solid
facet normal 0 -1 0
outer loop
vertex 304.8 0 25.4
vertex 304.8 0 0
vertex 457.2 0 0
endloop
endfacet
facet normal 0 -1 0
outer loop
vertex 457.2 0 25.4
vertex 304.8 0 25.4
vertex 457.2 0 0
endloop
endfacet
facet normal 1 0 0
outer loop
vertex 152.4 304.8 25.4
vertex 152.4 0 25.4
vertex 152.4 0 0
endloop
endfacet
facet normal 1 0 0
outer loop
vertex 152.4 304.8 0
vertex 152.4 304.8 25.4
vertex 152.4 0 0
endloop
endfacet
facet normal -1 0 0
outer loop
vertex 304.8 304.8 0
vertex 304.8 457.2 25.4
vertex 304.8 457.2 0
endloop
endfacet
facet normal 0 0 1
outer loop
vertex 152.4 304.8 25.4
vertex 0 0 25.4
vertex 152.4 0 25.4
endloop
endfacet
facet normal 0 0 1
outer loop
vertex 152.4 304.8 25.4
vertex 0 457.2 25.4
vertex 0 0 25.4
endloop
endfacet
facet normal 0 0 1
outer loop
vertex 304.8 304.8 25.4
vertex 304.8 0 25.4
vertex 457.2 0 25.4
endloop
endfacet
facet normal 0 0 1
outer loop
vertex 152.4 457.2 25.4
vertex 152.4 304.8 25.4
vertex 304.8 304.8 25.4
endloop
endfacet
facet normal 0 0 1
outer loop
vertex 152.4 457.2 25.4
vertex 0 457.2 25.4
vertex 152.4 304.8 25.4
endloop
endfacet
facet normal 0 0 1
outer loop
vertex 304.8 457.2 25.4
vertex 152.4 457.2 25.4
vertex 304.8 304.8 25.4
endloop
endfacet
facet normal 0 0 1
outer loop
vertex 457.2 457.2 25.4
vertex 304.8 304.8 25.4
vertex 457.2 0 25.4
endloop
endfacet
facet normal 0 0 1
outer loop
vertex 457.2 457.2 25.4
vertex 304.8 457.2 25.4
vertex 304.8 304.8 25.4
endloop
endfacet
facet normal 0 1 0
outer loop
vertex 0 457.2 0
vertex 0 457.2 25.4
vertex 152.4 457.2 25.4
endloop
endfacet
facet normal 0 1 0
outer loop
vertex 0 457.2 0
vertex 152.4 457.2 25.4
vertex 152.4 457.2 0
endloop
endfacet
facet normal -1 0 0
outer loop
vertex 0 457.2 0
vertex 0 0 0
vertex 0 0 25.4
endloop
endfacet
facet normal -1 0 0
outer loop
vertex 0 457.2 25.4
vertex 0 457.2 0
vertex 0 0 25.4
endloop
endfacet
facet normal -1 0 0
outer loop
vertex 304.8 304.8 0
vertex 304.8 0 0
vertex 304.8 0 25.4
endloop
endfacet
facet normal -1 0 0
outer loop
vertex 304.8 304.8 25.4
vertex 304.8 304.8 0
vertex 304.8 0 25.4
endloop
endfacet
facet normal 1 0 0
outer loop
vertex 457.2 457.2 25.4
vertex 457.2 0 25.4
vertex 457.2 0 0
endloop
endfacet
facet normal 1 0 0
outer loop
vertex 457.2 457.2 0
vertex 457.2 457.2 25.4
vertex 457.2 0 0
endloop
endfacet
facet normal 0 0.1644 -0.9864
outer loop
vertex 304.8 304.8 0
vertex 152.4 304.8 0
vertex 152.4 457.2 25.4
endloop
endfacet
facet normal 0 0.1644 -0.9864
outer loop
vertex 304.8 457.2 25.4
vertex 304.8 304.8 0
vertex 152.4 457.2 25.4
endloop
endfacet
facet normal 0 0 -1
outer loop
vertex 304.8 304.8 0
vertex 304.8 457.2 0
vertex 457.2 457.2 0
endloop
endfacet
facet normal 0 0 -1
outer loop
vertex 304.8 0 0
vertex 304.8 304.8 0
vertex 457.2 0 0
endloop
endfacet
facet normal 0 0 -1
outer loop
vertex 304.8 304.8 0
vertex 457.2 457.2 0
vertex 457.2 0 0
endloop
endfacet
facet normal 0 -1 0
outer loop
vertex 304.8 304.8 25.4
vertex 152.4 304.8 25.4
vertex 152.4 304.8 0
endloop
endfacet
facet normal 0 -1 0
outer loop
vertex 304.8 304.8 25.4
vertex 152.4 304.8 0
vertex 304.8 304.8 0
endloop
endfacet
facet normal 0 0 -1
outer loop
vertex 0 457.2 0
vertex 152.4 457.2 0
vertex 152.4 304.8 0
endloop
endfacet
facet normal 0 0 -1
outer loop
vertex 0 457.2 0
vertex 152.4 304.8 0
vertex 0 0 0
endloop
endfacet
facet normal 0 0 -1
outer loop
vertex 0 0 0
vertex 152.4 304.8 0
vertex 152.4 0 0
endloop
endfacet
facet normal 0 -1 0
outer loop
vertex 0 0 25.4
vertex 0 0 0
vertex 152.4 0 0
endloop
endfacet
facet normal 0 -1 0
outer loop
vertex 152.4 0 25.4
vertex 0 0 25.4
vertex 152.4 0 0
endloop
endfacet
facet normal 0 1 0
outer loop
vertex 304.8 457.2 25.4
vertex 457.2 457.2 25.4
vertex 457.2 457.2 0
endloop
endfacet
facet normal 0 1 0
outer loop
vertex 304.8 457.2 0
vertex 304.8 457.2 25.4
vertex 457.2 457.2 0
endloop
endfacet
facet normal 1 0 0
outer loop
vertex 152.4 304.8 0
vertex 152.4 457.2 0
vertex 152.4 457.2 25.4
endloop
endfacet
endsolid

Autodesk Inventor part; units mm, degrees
ref_plane "YZ Plane" through (0, 0, 0) normal (1, 0, 0) x (0, 1, 0)
ref_plane "XZ Plane" through (0, 0, 0) normal (0, 1, 0) x (-1, 0, 0)
ref_plane "XY Plane" through (0, 0, 0) normal (0, 0, 1) x (1, 0, 0)
sketch "Sketch1" plane through (0, 0, 0) normal (0, 0, 1) x (1, 0, 0)
  line L0 (0, 0) -> (457.2, 0)
  line L1 (457.2, 0) -> (457.2, 457.2)
  line L2 (457.2, 457.2) -> (0, 457.2)
  line L3 (0, 457.2) -> (0, 0)
  dimension "d0" = 457.2
  dimension "d1" = 457.2
extrude "Extrusion1" add sketch "Sketch1" along normal blind 25.4
sketch "Sketch2" plane through (0, 0, 0) normal (-1, 0, 0) x (0, 0, 1)
  line L0 (0, 457.2) -> (25.4, 457.2) projected
  line L1 (0, 457.2) -> (0, 304.8)
  line L2 (0, 0) -> (0, 457.2) projected
  line L3 (25.4, 0) -> (25.4, 457.2) projected
  line L4 (0, 304.8) -> (25.4, 457.2)
  dimension "d4" = 152.4
extrude "Extrusion2" cut sketch "Sketch2" against normal blind 457.2
sketch "Sketch3" plane through (0, 0, 0) normal (-1, 0, 0) x (0, 0, 1)
  line L0 (25.4, 457.2) -> (25.4, 0) projected
  line L1 (25.4, 457.2) -> (0, 457.2)
  line L2 (0, 304.8) -> (0, 0) projected
  line L3 (0, 457.2) -> (0, 304.8)
  line L4 (0, 304.8) -> (25.4, 457.2)
extrude "Extrusion3" add sketch "Sketch3" against normal blind 152.4
sketch "Sketch4" plane through (457.2, 0, 25.4) normal (1, 0, 0) x (0, 0, -1)
  line L0 (0, 0) -> (0, 457.2) projected
  line L1 (0, 457.2) -> (25.4, 457.2)
  line L2 (25.4, 304.8) -> (0, 457.2) projected
  line L3 (25.4, 457.2) -> (25.4, 304.8)
  line L4 (25.4, 304.8) -> (0, 457.2)
  point P0 (25.4, 0)
extrude "Extrusion4" add sketch "Sketch4" against normal blind 152.4
sketch "Sketch5" plane through (0, 0, 0) normal (0, -1, 0) x (1, 0, 0)
  line L0 (304.8, 25.4) -> (152.4, 25.4) projected
  line L1 (304.8, 25.4) -> (152.4, 25.4)
  line L2 (152.4, 25.4) -> (152.4, 0)
  line L3 (152.4, 0) -> (304.8, 0)
  line L4 (304.8, 0) -> (304.8, 25.4)
  point P0 (0, 0)
extrude "Extrusion5" cut sketch "Sketch5" against normal blind 304.8
properties part number "BackLiftProtoPart3"
